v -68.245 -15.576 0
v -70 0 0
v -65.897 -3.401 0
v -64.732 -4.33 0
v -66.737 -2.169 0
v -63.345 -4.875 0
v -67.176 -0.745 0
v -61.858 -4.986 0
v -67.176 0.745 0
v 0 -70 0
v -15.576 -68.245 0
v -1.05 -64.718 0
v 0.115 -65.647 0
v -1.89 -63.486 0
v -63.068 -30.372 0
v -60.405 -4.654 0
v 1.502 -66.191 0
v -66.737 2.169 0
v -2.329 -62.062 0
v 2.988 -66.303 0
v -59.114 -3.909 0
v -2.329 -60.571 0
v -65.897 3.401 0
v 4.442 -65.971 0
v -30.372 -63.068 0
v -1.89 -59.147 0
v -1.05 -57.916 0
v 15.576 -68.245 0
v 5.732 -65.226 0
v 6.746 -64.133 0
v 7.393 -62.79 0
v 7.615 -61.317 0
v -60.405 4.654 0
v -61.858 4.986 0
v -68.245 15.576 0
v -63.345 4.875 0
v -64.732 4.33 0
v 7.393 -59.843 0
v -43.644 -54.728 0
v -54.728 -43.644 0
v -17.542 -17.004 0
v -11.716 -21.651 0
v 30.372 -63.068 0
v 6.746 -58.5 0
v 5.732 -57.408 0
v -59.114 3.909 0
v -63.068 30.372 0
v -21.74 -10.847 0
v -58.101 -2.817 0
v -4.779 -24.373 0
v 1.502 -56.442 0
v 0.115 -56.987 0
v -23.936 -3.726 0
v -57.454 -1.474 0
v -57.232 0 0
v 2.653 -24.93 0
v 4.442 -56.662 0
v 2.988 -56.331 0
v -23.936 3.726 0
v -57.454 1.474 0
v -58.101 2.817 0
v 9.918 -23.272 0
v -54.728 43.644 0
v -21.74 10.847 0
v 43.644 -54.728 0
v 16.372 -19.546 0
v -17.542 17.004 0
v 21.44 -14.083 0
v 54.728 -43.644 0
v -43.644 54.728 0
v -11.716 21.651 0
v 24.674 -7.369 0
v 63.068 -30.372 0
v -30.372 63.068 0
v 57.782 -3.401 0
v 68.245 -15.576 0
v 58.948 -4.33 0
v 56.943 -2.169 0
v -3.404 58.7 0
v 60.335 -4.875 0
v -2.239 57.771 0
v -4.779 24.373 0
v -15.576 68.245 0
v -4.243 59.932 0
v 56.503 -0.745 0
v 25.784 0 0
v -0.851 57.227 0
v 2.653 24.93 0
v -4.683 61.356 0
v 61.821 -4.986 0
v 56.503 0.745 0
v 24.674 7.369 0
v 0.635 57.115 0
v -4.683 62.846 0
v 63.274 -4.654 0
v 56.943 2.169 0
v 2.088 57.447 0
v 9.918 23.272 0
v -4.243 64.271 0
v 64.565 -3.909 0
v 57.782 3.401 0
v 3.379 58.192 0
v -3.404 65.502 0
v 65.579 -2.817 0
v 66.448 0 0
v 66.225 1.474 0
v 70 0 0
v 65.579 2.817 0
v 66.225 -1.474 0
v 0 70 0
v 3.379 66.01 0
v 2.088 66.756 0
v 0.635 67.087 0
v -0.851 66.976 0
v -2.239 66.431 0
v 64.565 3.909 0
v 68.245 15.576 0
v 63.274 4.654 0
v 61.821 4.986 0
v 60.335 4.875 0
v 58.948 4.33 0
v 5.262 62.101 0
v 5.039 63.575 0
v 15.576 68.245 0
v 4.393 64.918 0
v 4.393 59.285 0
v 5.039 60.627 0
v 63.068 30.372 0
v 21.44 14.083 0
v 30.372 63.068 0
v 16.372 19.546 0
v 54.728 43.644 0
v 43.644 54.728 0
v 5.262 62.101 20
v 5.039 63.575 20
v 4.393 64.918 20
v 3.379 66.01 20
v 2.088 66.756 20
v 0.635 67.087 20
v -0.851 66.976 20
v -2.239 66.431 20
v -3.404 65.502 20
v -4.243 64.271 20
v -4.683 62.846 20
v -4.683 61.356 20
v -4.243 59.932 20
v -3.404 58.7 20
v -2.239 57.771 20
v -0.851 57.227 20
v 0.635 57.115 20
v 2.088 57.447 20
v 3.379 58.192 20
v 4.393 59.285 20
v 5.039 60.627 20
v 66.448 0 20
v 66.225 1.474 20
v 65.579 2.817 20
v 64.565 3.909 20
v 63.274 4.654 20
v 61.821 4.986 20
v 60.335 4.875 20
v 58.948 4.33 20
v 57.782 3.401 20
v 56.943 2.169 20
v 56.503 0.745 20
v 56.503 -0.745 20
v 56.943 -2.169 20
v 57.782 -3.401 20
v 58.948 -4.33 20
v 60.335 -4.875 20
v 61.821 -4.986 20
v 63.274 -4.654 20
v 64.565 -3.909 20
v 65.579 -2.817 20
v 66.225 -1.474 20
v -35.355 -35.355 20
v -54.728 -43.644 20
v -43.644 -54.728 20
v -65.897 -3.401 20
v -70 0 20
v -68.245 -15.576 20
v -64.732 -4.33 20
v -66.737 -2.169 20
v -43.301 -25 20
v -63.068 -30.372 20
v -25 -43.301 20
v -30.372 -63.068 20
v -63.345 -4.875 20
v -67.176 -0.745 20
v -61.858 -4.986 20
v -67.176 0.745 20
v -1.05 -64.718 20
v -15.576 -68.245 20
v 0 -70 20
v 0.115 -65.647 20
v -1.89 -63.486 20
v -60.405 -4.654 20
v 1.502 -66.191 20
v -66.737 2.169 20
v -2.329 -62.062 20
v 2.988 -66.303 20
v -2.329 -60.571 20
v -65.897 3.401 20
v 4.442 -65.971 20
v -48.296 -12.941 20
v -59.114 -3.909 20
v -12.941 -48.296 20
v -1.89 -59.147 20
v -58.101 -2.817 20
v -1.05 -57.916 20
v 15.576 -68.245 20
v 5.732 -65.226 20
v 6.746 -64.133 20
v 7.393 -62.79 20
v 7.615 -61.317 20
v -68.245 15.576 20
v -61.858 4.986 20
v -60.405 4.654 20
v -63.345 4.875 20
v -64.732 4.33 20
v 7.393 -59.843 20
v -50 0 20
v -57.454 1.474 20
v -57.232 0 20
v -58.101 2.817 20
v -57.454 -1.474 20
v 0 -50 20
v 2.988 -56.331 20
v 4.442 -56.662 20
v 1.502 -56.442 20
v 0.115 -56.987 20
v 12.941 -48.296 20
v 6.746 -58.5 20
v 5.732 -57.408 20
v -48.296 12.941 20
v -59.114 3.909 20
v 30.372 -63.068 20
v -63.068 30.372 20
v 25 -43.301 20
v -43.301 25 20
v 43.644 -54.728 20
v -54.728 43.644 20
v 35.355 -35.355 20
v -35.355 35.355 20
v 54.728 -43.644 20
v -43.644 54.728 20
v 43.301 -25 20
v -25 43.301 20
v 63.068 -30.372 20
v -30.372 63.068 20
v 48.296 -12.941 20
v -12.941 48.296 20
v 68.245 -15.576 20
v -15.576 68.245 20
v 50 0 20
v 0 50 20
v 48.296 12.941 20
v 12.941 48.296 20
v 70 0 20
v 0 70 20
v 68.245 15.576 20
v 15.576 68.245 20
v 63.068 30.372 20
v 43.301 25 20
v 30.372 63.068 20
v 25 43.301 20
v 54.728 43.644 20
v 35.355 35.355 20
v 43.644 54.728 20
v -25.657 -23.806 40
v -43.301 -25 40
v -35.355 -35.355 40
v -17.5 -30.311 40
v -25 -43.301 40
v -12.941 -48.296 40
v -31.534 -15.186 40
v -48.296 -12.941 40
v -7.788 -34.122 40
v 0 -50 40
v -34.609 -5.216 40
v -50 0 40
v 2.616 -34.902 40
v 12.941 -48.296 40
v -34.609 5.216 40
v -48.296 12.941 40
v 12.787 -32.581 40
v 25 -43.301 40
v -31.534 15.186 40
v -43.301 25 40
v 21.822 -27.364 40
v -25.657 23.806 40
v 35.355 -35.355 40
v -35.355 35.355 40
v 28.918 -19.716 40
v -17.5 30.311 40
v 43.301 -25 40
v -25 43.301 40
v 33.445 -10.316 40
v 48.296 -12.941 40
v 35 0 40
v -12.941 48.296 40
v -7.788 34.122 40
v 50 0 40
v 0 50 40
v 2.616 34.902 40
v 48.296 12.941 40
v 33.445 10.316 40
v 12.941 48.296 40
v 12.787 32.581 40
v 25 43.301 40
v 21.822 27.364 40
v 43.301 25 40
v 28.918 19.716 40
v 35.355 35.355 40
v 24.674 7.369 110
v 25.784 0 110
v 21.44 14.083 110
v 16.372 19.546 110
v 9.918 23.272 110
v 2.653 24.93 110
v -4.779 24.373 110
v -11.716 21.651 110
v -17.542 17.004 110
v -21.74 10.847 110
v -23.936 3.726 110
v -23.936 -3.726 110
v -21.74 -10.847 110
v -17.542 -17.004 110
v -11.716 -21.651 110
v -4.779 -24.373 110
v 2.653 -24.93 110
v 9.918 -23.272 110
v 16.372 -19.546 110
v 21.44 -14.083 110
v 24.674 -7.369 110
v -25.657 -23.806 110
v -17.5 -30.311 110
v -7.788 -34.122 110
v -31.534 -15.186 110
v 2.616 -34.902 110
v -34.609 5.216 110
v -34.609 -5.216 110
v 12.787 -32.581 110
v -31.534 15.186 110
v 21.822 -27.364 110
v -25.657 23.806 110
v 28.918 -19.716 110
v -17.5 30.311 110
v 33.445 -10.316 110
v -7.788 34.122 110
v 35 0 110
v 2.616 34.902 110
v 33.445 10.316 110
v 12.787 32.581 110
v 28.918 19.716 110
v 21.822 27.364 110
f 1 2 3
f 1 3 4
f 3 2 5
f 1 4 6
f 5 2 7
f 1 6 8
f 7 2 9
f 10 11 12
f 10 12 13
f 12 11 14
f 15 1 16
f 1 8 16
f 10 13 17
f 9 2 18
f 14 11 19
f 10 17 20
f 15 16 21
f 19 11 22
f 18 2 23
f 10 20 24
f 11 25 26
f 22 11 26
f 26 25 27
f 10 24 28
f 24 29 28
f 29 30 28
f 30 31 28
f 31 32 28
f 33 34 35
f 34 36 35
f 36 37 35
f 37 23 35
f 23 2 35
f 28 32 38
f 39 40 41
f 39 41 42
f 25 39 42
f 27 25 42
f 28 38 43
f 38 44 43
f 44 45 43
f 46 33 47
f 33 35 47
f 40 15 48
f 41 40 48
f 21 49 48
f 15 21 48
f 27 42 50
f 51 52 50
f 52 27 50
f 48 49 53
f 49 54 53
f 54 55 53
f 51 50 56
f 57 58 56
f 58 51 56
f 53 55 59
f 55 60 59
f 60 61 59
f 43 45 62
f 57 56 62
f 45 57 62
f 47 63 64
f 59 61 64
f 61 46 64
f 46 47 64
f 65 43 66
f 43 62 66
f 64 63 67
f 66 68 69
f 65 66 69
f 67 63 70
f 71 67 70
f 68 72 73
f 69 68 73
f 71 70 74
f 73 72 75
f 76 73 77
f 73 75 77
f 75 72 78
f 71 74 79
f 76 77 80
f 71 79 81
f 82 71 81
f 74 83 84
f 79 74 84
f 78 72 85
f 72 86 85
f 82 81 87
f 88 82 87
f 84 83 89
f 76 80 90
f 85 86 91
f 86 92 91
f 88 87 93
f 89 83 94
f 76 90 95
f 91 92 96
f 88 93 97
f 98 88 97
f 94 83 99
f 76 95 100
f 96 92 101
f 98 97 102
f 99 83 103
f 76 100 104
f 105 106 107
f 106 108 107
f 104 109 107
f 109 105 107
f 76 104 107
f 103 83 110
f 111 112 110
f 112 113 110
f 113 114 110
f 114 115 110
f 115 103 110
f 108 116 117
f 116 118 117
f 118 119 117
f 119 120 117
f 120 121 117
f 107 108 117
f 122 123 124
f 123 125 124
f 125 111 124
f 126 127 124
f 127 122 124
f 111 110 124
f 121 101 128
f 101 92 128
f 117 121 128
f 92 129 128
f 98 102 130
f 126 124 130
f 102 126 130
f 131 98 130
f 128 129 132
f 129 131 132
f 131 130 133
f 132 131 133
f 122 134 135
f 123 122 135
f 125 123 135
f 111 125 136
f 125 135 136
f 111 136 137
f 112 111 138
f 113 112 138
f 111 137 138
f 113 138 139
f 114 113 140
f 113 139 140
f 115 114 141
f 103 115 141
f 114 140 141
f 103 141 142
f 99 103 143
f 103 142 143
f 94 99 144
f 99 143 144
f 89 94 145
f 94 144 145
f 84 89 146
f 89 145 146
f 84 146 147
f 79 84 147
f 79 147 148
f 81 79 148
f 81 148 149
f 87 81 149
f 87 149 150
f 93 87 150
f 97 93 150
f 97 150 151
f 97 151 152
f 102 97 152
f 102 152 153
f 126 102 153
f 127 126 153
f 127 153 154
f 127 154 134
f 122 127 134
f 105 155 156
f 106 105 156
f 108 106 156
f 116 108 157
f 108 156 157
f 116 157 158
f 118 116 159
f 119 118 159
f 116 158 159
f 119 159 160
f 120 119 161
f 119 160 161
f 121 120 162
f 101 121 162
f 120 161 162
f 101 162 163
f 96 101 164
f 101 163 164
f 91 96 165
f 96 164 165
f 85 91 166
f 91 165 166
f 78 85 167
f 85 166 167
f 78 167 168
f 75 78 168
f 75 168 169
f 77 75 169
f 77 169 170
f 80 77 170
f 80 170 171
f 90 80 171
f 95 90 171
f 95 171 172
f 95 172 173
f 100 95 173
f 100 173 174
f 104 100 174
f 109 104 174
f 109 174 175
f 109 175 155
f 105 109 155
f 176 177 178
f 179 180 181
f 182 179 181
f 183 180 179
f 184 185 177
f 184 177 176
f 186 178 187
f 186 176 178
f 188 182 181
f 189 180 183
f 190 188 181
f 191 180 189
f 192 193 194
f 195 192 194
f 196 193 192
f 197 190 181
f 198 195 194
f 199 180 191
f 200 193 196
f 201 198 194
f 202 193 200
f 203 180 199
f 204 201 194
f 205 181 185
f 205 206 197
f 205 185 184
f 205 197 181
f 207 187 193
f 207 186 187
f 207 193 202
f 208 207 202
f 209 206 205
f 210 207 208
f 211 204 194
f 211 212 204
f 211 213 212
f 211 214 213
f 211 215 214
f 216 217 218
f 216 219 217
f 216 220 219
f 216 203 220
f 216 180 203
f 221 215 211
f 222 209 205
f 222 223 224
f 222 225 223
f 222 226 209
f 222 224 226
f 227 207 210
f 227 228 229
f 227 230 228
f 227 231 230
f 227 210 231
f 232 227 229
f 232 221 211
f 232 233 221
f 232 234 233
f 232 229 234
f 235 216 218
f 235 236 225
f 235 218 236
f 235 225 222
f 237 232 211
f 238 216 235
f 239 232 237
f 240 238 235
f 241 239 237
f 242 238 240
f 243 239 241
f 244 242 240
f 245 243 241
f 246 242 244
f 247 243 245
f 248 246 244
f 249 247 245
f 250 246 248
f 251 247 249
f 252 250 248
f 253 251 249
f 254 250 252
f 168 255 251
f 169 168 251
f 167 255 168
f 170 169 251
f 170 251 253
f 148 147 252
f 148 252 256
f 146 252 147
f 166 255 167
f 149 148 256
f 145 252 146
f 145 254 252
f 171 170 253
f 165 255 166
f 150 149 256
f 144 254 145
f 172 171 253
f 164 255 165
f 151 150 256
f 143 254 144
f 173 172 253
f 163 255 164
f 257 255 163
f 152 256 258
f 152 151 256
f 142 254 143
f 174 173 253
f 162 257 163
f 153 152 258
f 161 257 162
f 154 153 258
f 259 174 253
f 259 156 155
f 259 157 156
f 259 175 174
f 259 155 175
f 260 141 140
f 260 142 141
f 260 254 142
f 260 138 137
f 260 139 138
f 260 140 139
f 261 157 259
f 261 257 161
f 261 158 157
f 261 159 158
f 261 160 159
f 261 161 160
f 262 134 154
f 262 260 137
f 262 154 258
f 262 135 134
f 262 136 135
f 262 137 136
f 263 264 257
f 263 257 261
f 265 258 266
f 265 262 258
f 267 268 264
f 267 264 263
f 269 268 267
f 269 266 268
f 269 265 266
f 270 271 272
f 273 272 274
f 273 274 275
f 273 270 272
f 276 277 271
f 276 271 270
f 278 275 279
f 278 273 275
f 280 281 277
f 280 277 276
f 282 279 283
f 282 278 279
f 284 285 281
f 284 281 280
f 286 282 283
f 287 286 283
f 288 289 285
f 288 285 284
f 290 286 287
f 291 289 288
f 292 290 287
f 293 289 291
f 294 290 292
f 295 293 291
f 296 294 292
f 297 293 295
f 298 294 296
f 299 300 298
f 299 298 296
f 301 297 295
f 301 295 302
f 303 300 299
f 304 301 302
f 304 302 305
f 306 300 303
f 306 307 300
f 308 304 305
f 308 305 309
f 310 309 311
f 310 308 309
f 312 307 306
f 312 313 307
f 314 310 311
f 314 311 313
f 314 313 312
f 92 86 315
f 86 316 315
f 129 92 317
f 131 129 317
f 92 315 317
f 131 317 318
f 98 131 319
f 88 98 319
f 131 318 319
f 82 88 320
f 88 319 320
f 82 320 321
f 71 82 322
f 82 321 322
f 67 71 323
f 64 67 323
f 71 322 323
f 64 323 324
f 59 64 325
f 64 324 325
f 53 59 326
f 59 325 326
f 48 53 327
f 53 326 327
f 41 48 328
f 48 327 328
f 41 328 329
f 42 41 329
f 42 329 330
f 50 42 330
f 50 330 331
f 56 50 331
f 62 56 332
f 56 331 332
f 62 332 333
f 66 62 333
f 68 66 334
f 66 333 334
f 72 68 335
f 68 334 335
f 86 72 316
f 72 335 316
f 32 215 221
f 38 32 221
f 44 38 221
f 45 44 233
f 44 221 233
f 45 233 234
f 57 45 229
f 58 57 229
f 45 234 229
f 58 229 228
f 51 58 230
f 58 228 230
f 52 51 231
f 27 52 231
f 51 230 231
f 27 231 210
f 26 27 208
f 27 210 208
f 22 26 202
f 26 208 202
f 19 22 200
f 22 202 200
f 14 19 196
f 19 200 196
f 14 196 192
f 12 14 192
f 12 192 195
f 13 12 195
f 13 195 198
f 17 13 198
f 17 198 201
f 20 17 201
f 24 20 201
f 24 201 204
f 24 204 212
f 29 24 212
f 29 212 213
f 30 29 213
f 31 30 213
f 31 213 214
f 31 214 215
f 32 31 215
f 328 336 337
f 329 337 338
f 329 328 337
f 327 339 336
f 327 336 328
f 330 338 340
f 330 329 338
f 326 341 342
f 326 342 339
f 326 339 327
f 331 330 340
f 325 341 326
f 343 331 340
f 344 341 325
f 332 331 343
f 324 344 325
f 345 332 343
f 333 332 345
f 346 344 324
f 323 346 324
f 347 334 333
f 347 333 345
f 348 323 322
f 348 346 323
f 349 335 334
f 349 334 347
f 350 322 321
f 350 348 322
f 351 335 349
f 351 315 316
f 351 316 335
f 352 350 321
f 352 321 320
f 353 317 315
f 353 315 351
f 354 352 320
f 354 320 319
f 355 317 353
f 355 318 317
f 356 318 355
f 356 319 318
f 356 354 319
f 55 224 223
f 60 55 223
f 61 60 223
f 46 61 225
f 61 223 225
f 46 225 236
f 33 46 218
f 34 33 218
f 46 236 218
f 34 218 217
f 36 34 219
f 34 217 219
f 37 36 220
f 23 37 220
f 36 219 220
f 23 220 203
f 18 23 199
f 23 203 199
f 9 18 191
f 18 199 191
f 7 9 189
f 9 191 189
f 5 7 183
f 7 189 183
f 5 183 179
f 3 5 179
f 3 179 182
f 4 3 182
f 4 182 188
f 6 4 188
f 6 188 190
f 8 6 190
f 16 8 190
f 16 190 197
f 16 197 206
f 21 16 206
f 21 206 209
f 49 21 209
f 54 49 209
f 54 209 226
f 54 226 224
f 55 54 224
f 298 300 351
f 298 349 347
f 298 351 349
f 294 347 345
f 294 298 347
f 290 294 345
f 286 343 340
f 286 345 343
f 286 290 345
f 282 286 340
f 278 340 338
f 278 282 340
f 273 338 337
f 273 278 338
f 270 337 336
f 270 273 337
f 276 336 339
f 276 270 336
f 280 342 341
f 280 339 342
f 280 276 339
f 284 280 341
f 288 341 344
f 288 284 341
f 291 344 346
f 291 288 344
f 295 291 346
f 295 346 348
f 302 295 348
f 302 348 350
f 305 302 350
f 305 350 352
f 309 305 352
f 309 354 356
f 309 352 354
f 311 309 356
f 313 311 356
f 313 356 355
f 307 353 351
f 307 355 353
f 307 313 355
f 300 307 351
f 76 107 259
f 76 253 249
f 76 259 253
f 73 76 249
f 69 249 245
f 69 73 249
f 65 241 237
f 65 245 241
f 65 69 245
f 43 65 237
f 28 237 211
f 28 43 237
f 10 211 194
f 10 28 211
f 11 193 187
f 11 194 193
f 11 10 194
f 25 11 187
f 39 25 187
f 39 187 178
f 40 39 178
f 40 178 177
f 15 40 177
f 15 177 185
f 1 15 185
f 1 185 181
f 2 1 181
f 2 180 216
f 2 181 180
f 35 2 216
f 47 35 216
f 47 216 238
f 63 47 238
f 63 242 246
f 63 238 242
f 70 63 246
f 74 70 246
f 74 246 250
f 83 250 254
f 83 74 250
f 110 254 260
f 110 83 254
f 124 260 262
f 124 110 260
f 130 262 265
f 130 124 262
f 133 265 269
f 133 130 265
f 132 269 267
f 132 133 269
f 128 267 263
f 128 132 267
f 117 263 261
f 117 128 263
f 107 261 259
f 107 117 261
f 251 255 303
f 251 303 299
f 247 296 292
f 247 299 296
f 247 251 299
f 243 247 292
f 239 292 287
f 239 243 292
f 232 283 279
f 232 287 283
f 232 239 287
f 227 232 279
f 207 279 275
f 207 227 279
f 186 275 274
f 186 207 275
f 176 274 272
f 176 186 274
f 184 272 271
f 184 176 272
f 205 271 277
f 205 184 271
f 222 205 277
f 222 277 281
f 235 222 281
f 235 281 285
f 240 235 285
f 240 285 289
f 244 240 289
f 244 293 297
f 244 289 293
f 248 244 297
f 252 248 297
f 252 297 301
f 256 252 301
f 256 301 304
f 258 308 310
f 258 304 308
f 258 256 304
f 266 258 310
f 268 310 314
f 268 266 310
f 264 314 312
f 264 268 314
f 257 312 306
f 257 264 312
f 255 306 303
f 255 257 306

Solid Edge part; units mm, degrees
sketch "Sketch1" plane through (0, 0, 0) normal (0, 0, 1) x (1, 0, 0)
  circle A0 centre (0, 0) radius 70
extrude "Protrusion1" add sketch "Sketch1" along normal blind 20
sketch "Sketch2" plane through (0, 0, 20) normal (0, 0, 1) x (1, 0, 0)
  circle A0 centre (0, 0) radius 50
extrude "ExtrudedProtrusion_2" add sketch "Sketch2" along normal blind 20
sketch "Sketch3" plane through (0, 0, 40) normal (0, 0, 1) x (1, 0, 0)
  circle A0 centre (0, 0) radius 35
extrude "ExtrudedProtrusion_3" add sketch "Sketch3" along normal blind 70
sketch "Sketch4" plane through (0, 0, 110) normal (0, 0, 1) x (1, 0, 0)
  circle A0 centre (0.7844, 0) radius 25
extrude "ExtrudedCutout_1" cut sketch "Sketch4" against normal blind 217.955
sketch "Sketch5" plane through (0, 0, 20) normal (0, 0, 1) x (1, 0, 0)
  circle A0 centre (-62.2319, 0) radius 5
  circle A1 centre (61.4475, 0) radius 5
  circle A2 centre (2.6148, -61.3167) radius 5
  circle A3 centre (0.2615, 62.1012) radius 5
extrude "ExtrudedCutout_2" cut sketch "Sketch5" against normal blind 134.0931
